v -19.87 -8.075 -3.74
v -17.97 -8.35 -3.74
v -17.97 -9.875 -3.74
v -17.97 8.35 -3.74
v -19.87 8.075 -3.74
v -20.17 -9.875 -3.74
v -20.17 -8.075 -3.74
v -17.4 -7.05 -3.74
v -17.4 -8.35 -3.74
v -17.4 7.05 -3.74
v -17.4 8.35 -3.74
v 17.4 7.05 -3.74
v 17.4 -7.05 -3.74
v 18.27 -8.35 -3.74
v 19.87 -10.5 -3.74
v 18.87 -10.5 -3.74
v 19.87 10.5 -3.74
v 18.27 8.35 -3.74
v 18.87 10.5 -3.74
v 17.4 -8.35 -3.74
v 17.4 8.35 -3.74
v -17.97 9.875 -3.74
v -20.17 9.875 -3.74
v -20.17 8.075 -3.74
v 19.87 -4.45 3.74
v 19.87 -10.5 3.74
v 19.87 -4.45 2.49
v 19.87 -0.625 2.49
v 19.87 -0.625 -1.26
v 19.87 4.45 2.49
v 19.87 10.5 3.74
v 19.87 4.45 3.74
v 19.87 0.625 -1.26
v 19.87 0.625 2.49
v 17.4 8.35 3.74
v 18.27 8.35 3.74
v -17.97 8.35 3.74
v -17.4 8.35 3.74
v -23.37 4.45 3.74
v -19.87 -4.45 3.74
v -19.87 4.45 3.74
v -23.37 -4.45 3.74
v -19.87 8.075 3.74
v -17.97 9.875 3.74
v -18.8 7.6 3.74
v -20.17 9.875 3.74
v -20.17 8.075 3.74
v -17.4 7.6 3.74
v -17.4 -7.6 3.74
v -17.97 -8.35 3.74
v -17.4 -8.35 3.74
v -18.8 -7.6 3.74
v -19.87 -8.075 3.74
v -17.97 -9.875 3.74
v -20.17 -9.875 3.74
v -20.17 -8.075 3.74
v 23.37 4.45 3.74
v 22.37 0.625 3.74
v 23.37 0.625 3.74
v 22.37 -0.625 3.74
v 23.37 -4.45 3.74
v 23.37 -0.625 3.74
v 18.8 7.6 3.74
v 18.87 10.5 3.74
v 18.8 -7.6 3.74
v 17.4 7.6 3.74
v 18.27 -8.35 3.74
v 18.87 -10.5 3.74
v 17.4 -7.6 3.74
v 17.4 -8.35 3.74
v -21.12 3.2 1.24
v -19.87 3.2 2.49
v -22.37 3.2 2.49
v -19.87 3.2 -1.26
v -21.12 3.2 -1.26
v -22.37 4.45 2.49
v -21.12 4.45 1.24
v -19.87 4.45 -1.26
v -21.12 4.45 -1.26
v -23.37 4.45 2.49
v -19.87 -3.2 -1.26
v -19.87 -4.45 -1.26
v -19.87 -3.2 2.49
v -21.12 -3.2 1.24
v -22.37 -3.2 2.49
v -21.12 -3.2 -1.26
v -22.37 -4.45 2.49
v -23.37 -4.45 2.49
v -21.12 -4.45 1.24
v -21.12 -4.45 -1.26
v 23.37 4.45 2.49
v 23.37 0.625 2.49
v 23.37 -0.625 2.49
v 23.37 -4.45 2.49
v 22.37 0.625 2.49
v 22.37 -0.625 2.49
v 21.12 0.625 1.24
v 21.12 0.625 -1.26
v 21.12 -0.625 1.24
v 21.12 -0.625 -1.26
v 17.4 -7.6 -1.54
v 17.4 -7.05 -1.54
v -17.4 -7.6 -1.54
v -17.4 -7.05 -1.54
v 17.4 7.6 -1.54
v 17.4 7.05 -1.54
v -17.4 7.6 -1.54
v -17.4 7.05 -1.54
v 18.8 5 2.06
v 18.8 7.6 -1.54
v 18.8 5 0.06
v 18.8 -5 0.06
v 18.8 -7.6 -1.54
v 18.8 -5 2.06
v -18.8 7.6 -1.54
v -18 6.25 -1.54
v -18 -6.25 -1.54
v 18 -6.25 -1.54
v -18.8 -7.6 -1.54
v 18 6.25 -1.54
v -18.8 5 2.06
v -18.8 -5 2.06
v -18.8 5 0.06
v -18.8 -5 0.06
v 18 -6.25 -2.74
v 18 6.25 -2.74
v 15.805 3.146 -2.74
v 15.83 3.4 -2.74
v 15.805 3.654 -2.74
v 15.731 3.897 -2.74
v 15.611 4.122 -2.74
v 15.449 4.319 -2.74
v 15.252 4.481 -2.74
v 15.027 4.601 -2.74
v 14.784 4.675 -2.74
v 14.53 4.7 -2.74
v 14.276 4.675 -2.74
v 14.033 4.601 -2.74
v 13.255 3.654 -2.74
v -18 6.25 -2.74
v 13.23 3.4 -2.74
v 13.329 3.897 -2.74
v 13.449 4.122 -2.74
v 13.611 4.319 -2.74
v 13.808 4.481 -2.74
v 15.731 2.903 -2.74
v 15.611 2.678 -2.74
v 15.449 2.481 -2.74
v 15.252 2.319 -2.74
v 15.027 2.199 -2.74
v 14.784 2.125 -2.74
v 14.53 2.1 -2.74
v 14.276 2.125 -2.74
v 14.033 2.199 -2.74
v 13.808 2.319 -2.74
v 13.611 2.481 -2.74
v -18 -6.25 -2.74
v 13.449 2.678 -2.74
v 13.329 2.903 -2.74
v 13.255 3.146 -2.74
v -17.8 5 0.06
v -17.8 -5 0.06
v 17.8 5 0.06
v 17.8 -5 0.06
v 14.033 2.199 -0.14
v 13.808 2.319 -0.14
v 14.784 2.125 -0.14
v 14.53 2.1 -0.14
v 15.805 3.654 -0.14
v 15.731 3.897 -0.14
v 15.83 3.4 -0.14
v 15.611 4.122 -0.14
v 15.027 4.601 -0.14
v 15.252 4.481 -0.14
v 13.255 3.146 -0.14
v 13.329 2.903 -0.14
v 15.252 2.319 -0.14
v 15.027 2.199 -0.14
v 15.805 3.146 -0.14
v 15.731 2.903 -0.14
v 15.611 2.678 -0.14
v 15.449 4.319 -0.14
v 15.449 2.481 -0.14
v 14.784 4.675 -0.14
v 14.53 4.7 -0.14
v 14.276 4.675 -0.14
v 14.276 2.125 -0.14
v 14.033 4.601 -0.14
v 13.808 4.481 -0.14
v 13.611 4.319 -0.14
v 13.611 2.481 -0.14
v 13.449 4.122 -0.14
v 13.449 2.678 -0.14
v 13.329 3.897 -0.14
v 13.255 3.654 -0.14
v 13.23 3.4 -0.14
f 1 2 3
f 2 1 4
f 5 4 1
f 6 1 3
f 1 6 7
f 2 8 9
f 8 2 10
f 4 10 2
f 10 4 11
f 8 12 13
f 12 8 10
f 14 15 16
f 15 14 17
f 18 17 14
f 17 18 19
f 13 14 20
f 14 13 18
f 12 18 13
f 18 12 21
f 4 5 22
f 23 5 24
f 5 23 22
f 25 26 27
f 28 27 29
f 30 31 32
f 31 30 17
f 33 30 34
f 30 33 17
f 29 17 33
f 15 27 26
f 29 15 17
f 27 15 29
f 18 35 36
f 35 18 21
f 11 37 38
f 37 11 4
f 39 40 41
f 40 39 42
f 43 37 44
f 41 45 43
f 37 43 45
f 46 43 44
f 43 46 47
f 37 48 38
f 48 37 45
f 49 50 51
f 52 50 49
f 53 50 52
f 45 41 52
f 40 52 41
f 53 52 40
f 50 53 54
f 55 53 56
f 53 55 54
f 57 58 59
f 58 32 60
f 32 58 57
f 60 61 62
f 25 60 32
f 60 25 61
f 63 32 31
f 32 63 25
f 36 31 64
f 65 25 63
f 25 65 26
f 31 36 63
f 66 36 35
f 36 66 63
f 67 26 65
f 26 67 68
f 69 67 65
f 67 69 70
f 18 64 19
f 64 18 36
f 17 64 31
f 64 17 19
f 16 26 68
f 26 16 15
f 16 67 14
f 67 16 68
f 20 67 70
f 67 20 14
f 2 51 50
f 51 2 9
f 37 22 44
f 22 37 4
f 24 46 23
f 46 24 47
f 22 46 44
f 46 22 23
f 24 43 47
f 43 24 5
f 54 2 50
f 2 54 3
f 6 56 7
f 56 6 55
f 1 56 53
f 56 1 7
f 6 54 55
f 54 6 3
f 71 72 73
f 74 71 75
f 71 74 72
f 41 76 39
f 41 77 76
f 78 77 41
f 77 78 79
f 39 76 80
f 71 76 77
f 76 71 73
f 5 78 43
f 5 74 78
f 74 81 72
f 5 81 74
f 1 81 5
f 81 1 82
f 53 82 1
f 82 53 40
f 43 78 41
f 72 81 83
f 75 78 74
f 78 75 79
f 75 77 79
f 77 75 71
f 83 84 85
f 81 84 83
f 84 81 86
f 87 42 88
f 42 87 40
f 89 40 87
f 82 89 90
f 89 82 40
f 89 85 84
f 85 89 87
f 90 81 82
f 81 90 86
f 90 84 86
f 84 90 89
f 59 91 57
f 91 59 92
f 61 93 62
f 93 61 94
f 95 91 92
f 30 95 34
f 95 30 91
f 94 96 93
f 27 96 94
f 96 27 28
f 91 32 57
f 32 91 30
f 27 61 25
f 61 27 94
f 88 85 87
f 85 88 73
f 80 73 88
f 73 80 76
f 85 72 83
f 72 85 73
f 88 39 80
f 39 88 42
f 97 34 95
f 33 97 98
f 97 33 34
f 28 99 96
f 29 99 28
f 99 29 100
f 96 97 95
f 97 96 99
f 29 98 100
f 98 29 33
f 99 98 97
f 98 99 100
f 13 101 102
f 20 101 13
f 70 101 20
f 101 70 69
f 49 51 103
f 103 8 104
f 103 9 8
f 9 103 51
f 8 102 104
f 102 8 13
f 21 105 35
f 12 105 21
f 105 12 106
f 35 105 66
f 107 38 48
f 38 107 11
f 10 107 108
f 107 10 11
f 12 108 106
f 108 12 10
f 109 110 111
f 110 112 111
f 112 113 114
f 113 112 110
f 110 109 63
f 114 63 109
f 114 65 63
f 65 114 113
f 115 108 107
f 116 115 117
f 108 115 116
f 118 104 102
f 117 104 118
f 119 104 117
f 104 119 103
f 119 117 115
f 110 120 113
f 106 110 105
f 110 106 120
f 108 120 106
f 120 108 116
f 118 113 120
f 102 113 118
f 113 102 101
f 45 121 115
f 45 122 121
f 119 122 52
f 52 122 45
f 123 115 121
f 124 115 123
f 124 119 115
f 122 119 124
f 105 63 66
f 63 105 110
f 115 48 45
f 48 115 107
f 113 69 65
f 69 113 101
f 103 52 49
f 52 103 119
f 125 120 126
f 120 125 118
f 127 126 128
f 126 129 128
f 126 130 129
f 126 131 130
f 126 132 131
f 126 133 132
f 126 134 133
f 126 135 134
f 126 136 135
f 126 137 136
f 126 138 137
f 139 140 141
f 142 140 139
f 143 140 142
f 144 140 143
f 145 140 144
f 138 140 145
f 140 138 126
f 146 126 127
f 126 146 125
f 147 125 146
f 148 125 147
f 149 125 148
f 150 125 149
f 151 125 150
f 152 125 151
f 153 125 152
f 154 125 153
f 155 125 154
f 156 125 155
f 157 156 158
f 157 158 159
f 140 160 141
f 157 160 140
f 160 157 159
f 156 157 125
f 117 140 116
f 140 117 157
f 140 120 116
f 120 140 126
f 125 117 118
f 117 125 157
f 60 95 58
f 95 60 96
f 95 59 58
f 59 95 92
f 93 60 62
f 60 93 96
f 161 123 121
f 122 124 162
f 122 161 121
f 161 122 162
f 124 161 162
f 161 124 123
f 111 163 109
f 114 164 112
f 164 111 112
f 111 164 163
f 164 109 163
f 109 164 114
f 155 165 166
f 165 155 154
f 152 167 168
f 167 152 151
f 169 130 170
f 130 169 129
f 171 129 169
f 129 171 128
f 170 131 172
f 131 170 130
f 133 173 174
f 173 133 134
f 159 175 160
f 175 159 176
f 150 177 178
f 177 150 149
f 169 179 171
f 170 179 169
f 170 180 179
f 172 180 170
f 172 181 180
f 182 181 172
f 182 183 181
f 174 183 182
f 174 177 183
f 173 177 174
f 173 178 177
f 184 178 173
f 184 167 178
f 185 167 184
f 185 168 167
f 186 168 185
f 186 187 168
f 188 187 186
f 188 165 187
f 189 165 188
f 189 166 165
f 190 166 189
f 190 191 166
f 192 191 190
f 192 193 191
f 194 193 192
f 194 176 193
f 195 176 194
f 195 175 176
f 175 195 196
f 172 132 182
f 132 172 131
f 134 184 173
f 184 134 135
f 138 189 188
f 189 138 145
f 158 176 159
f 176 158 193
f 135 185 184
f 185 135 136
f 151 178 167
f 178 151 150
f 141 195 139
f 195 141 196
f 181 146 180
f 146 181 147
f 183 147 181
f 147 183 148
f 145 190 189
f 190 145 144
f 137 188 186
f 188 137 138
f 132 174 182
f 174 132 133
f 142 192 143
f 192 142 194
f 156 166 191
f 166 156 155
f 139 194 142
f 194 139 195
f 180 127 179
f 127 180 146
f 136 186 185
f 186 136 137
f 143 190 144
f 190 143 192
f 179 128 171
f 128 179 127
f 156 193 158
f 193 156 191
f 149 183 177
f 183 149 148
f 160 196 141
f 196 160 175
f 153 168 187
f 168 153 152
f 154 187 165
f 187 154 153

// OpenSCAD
// OpenSCAD model for pcb2molex8878
// Mates with pcb2molex8878.kicad_pcb

// Carrier to hold a pcb in place of a DIP28
// to fit into Molex 8878 socket found in some vintage computers.
// Ex: Tandy Model 100, 102, 200, 600
//       Epson PX-4, PX-8

// Brian K. White - b.kenyon.w@gmail.com
// http://tandy.wiki/pcb2molex8878
// http://www.github.com/aljex/pcb2molex8878

// -------------------------------------------------------------------------
// globals

// main outside box
main_x=39.74;
main_y=16.7;
main_z=7.48;

// clearance around socket contacts
contacts_x=34.8;
contacts_y=2.6;

// pcb
pcb_x=37.6;
pcb_y=15.2;
pcb_z=1.6;
pcb_elev=2.2;

// cavity in bottom tray for backside components and through-hole legs 
pocket_x=36;
pocket_y=12.5;
pocket_z=1.2;

// box corner posts
bc_x=2.2; // X len of 1 post
bc_y=1.8; // Y width of 1 post
bc_xe=0.3; // X extend past main_x
bc_yo=19.75;  // total Y outside end to end both posts

// wedge corner posts
wc_x1=1.6; // thick end of wedge
wc_x2=1; // thin end of wedge
wc_y=21; // total Y outside end to end both posts

// socket polarity blades
blade_z=5; // height
blade_x1=2.5; // wide legnth
blade_x2=1.25; // narrow length 
bt_thickness=1.25; // blade & tab thickness
tab_y=8.9; // width of top tabs
tab_x=3.5; // tab X extend past main_x

// pcb polarity pin
pp_x=14.53;  // center X
pp_y=3.4;  // center Y
pp_z=pcb_elev+pcb_z-0.2;  // pin height less than wedge bottom
pp_d=2.6; // diameter


// pcb retainer wedges
w_x=1;  // thick end
w_y=10;  // width
w_z=2;  // height


module mirror_copy(vector){
    children();
    mirror(vector) children();
}

module blade(){
    rotate([90,0,0]) translate([0,-blade_z+main_z/2,0]) linear_extrude(bt_thickness) polygon([ [0,0],[0,blade_z],[blade_x1,blade_z],[blade_x1,blade_z-bt_thickness],[blade_x2,blade_z-bt_thickness*2],[blade_x2,0] ]);
}

module wing(){
    cube([tab_x,tab_y,bt_thickness],center=true);
}

module wedge(){
   rotate([90,0,0]) linear_extrude(w_y) polygon([ [0,0],[0,w_z],[w_x,0] ]);
}

module complexObject(){
    difference(){

        // === ADDITIVE ===
        union(){
            // main outer box
            cube([main_x,main_y,main_z],center=true);

            // wedge corner posts  - pin 1 end
            mirror_copy([0,1,0]) translate([main_x/2,main_y/2,-main_z/2]) linear_extrude(main_z) polygon([ [0,0],[0,wc_y/2-main_y/2],[-wc_x2,wc_y/2-main_y/2],[-wc_x1,0] ]);
            
            // box corner posts
            mirror_copy([0,1,0]) translate([-(main_x/2+bc_xe),bc_yo/2-bc_y,-main_z/2]) cube([bc_x,bc_y,main_z]);
            
            // tabs
            translate([main_x/2+tab_x/2,0,main_z/2-bt_thickness/2]) wing();
            translate([-(main_x/2+tab_x/2),0,main_z/2-bt_thickness/2]) wing();

            // socket polarity blades
            translate([main_x/2,bt_thickness/2,0]) blade(); // pin 1 end
            mirror_copy([0,1,0]) translate([-main_x/2,tab_y/2-bt_thickness,0]) rotate([0,0,180]) blade();
        }

        // === SUBTRACTIVE ===
        union(){
            // main cavity for pcb
            translate([0,0,pcb_elev]) cube([pcb_x,pcb_y,main_z],center=true);
            
            // pocket for backside components
            translate([0,0,pcb_elev-pocket_z]) cube([pocket_x,pocket_y,main_z],center=true);
            
            // clearance for socket contacts
            mirror_copy([0,1,0]) translate([0,-main_y/2,0]) cube([contacts_x,contacts_y,main_z+1],center=true);
            
            // notch in wing 1
            translate([main_x/2+blade_x1,-bt_thickness/2,main_z/2-bt_thickness-0.5]) cube([tab_x-blade_x1+1,bt_thickness,bt_thickness+1]);
        }
        
    }
}

// most of the body
complexObject();

// pcb retainer wedges
mirror_copy([1,0,0]) translate([-pcb_x/2,w_y/2,-main_z/2+pcb_elev+pcb_z]) wedge();

// pcb polarity pin
translate([pp_x,pp_y,-main_z/2+pp_z/2]) cylinder(h=pp_z, d=pp_d,center=true,$fn=32);
